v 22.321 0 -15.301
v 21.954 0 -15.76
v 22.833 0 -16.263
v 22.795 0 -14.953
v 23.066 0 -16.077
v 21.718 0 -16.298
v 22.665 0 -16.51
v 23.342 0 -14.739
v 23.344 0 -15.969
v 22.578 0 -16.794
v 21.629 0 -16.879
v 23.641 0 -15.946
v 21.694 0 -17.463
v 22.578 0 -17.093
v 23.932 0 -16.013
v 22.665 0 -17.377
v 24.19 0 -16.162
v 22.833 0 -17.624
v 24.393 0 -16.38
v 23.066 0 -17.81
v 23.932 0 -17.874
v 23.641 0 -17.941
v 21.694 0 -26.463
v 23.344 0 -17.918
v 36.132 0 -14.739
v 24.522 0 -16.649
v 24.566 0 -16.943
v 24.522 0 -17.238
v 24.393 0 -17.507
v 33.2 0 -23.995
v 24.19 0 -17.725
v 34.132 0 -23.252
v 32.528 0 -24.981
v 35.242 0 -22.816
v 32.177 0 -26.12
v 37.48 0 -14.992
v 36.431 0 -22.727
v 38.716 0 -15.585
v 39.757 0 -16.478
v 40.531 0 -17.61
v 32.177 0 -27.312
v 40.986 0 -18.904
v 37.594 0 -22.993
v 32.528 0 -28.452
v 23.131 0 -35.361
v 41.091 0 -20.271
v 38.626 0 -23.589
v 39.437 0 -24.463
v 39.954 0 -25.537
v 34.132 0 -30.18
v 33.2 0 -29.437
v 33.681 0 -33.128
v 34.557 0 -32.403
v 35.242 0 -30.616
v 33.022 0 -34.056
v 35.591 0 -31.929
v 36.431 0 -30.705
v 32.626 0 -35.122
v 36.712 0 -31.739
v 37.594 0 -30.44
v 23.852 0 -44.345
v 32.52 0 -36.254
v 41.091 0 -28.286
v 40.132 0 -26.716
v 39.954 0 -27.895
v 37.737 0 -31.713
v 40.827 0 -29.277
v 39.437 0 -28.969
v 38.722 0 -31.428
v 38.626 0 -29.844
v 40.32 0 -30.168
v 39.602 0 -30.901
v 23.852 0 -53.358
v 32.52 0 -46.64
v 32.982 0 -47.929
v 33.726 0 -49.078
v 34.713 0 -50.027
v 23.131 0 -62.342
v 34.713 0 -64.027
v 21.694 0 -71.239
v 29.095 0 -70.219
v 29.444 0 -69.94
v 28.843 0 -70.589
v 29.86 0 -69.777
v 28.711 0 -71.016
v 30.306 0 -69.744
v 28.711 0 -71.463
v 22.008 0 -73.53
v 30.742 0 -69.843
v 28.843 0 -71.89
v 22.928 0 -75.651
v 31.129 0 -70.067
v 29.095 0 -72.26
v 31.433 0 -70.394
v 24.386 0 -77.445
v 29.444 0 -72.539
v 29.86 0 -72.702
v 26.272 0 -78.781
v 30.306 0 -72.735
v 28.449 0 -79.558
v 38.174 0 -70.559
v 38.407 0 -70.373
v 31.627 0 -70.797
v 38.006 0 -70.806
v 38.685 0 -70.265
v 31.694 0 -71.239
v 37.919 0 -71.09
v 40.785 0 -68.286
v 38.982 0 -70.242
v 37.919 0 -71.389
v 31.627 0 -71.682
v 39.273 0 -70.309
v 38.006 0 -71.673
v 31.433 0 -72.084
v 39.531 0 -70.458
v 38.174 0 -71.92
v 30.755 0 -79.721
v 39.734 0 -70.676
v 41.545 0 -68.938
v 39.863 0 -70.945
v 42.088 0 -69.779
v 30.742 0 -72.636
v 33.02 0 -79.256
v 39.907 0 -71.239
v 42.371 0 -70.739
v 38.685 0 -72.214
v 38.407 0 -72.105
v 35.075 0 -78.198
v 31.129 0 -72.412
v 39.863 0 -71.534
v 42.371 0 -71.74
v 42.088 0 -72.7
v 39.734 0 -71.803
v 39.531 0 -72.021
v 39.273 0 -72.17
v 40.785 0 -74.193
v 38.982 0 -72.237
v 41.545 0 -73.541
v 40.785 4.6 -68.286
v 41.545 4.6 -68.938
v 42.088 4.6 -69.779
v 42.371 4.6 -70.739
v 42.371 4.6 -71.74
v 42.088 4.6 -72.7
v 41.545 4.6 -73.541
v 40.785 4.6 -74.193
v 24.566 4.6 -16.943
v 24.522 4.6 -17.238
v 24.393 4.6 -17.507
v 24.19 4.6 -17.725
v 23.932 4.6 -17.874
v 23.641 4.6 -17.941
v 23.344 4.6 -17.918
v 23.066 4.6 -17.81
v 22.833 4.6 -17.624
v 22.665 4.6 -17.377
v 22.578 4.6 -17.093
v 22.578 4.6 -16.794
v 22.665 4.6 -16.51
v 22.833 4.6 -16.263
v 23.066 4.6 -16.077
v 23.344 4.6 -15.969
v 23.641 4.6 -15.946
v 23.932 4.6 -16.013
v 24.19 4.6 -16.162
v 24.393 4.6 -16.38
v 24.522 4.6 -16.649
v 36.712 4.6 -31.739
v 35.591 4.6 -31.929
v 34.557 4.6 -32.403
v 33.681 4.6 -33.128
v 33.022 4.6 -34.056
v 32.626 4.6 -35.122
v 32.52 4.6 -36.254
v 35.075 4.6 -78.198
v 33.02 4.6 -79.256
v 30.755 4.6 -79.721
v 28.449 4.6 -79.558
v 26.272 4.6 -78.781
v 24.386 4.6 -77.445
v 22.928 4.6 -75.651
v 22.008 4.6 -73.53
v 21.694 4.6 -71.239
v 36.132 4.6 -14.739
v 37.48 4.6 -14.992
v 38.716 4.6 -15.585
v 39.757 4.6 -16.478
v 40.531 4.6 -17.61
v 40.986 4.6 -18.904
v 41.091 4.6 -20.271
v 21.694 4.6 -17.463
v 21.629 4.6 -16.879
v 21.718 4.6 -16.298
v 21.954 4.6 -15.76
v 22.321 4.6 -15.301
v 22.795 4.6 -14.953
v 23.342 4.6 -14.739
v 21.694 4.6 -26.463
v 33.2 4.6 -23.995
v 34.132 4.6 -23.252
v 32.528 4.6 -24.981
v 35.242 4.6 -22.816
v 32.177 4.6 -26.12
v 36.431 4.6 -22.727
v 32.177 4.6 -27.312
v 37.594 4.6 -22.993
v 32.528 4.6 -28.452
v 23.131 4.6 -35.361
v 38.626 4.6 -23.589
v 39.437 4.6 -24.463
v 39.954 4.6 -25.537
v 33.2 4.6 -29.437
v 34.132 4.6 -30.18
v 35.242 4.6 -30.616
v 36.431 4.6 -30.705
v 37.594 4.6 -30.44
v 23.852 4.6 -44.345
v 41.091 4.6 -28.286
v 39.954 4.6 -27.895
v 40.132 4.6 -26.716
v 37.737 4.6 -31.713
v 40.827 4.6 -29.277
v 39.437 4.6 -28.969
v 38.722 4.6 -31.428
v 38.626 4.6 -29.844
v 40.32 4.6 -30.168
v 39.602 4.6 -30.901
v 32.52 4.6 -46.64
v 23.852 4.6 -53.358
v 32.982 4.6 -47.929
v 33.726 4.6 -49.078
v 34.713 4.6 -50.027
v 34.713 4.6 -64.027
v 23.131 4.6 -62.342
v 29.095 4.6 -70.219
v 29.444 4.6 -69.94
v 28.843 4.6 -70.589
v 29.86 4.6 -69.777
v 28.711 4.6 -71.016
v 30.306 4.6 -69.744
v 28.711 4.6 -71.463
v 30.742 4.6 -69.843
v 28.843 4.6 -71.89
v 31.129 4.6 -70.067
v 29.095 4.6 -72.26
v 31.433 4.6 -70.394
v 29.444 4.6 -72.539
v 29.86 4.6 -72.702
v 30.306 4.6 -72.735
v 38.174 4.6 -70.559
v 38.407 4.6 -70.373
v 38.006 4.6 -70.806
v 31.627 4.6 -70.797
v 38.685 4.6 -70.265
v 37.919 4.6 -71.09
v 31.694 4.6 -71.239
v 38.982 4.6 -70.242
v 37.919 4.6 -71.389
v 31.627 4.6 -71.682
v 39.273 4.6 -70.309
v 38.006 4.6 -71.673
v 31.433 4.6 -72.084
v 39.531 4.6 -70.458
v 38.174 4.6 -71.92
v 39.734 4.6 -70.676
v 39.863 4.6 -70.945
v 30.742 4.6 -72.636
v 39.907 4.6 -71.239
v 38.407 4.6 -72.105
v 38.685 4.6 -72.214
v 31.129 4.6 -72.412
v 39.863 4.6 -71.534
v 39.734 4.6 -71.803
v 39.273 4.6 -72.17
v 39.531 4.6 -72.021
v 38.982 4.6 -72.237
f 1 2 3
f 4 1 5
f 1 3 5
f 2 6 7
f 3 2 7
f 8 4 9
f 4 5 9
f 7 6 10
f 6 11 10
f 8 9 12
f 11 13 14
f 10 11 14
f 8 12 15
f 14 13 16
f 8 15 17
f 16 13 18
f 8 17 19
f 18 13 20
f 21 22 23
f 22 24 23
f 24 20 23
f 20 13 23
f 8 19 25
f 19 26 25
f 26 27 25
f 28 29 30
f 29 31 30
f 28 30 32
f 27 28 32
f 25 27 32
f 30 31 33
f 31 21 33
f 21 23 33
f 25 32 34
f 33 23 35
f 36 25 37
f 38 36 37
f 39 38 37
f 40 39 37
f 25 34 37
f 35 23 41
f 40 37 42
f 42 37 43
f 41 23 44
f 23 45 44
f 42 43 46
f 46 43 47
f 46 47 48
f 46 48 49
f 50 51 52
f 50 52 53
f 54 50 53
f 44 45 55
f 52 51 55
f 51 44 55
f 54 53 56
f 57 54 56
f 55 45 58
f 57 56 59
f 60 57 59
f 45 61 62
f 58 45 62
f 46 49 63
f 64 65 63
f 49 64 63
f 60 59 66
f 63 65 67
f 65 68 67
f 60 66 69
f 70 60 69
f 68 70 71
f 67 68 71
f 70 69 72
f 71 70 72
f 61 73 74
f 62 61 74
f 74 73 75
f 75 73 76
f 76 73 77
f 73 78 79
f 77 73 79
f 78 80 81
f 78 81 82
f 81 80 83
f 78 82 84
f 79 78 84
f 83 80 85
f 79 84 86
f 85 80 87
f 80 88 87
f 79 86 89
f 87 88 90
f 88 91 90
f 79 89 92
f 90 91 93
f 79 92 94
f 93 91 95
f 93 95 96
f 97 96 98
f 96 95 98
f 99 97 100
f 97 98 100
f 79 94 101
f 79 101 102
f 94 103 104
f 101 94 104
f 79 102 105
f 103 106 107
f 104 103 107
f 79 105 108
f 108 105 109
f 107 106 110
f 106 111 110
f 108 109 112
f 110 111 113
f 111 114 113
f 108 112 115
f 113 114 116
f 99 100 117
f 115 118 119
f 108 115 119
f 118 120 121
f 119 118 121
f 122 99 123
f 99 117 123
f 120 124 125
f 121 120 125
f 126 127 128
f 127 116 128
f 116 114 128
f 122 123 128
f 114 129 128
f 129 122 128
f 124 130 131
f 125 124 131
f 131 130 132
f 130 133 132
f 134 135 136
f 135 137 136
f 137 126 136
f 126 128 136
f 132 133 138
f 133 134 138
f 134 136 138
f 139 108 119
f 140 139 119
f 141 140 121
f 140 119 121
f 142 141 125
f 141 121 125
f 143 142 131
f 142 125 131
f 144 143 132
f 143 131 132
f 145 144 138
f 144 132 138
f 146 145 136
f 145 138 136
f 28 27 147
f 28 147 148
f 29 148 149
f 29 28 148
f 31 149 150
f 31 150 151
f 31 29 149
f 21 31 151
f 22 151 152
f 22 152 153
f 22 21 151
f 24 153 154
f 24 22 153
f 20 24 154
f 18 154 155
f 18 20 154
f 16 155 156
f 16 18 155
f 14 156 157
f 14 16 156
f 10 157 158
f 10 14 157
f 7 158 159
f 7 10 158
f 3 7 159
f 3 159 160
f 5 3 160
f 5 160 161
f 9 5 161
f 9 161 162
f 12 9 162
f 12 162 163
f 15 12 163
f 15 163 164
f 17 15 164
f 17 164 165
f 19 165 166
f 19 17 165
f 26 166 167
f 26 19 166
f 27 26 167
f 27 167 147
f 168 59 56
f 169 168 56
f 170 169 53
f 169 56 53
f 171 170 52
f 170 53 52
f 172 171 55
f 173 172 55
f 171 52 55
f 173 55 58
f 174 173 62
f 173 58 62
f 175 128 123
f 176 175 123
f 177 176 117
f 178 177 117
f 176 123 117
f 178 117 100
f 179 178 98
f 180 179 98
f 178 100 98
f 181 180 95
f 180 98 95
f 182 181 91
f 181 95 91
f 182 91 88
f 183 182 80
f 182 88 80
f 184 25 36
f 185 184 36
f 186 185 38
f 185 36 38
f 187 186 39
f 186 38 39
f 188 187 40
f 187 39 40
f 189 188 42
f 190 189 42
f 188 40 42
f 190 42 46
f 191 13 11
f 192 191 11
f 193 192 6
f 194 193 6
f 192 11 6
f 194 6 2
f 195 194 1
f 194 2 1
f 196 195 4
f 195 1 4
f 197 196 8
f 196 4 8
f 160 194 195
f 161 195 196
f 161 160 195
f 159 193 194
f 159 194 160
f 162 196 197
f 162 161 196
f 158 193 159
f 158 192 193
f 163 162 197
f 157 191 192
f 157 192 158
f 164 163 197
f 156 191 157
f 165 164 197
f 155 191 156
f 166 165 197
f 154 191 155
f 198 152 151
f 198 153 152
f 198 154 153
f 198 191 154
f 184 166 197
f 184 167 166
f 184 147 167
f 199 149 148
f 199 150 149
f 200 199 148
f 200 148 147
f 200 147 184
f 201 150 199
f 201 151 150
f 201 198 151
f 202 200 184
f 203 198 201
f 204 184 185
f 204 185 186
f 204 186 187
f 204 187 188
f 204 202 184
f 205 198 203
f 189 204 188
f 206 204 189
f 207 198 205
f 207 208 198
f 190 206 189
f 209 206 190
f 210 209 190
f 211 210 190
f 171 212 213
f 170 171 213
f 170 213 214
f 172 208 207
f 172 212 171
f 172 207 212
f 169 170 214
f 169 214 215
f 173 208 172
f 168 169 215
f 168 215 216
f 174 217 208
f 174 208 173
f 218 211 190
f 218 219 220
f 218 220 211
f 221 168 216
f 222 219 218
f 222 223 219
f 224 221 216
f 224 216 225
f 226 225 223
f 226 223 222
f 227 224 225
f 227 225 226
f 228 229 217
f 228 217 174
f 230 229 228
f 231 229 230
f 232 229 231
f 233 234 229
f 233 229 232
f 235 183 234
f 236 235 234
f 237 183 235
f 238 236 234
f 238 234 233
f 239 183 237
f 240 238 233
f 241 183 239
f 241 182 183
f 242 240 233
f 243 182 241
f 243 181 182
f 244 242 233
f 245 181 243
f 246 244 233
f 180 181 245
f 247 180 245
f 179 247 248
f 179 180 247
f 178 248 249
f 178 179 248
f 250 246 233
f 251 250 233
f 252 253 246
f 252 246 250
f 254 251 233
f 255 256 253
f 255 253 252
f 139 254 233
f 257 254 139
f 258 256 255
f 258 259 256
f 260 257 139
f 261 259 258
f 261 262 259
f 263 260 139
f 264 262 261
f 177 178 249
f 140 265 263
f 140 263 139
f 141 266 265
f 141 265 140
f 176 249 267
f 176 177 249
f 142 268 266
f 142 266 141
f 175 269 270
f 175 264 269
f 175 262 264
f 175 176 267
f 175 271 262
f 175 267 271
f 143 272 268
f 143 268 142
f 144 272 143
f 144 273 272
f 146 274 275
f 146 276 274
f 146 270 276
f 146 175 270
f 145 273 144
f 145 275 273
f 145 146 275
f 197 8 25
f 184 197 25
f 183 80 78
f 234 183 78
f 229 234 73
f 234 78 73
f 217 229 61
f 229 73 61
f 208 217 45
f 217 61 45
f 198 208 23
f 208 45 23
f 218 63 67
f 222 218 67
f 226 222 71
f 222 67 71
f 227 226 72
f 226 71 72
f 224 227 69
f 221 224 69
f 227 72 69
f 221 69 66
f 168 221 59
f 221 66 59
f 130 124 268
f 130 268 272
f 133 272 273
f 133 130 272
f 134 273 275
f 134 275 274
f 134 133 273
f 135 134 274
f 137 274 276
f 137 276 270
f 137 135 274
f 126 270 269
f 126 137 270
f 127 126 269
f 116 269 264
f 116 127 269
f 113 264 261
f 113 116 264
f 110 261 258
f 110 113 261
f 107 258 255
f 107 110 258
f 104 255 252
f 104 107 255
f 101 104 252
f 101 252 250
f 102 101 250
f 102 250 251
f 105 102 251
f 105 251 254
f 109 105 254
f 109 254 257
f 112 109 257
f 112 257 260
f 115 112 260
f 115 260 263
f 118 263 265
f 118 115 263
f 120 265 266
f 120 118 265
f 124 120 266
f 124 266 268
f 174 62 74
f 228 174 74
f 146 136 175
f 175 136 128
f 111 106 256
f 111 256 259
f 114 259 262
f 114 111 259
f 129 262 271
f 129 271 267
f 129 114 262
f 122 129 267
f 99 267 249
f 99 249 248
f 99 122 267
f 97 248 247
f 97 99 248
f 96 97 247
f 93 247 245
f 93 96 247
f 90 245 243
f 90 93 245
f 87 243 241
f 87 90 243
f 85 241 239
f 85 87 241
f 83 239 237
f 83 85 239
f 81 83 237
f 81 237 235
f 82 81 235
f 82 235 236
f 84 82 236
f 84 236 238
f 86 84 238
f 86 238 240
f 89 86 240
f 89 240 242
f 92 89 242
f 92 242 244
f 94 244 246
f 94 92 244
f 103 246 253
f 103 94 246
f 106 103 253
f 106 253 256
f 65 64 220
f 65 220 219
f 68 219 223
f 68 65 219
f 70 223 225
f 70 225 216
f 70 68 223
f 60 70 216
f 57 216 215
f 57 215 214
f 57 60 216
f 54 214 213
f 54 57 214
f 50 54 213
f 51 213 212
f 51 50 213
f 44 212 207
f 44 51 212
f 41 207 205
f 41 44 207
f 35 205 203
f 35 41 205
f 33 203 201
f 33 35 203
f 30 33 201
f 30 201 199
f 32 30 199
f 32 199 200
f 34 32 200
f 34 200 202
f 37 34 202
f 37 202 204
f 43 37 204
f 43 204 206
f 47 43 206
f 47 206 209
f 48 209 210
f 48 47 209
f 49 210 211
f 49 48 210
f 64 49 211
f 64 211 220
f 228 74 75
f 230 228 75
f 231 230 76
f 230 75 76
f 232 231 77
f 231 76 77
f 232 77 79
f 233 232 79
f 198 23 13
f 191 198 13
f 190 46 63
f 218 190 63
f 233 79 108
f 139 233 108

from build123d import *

# Parameters (mm, degrees)
SKETCH1_R           = 1.5
SKETCH1_R_2         = 1
SKETCH1_R_3         = 4
BOSS_EXTRUDE1_DEPTH = 4.6


with BuildPart() as part:
    # Sketch1 → Boss-Extrude1 (new body)
    with BuildSketch(Plane(origin=(0, 0, 0), x_dir=(1, 0, 0), z_dir=(0, 1, 0))):
        with BuildLine():
            Line((33.841256749, 14.73946958), (36.132184269, 14.73946958))
            ThreePointArc((36.132184269, 14.73946958), (39.75713684, 16.478313044), (41.09081738, 20.271089593))
            Line((41.09081738, 20.271089593), (41.09081738, 28.286294101))
            ThreePointArc((41.09081738, 28.286294101), (39.602380799, 30.901377208), (36.712338736, 31.739088372))
            ThreePointArc((36.712338736, 31.739088372), (33.680921675, 33.128286782), (32.51969773, 36.254133959))
            Line((32.51969773, 36.254133959), (32.51969773, 46.640032758))
            ThreePointArc((32.51969773, 46.640032758), (33.320707465, 48.524930167), (34.713196388, 50.026738889))
            Line((34.713196388, 50.026738889), (34.713196388, 64.026738889))
            Line((34.713196388, 64.026738889), (40.7852702, 68.285935139))
            ThreePointArc((40.7852702, 68.285935139), (42.40733668, 71.23946958), (40.7852702, 74.193004021))
            Line((40.7852702, 74.193004021), (35.075266798, 78.198229556))
            ThreePointArc((35.075266798, 78.198229556), (26.272366536, 78.780683171), (21.694113287, 71.23946958))
            ThreePointArc((21.694113287, 71.23946958), (23.941923331, 48.851382594), (21.694113287, 26.463295609))
            Line((21.694113287, 26.463295609), (21.694113287, 17.463295609))
            ThreePointArc((21.694113287, 17.463295609), (21.954167675, 15.759997208), (23.342467746, 14.73946958))
            Line((23.342467746, 14.73946958), (33.841256749, 14.73946958))
        make_face()
        with Locations((30.194113287, 71.23946958)):
            Circle(SKETCH1_R, mode=Mode.SUBTRACT)
        with Locations((38.90733668, 71.23946958)):
            Circle(SKETCH1_R_2, mode=Mode.SUBTRACT)
        with Locations((23.566412567, 16.94349474)):
            Circle(SKETCH1_R_2, mode=Mode.SUBTRACT)
        with Locations((36.132184269, 26.716174154)):
            Circle(SKETCH1_R_3, mode=Mode.SUBTRACT)
    extrude(amount=BOSS_EXTRUDE1_DEPTH)


solid = part.part
